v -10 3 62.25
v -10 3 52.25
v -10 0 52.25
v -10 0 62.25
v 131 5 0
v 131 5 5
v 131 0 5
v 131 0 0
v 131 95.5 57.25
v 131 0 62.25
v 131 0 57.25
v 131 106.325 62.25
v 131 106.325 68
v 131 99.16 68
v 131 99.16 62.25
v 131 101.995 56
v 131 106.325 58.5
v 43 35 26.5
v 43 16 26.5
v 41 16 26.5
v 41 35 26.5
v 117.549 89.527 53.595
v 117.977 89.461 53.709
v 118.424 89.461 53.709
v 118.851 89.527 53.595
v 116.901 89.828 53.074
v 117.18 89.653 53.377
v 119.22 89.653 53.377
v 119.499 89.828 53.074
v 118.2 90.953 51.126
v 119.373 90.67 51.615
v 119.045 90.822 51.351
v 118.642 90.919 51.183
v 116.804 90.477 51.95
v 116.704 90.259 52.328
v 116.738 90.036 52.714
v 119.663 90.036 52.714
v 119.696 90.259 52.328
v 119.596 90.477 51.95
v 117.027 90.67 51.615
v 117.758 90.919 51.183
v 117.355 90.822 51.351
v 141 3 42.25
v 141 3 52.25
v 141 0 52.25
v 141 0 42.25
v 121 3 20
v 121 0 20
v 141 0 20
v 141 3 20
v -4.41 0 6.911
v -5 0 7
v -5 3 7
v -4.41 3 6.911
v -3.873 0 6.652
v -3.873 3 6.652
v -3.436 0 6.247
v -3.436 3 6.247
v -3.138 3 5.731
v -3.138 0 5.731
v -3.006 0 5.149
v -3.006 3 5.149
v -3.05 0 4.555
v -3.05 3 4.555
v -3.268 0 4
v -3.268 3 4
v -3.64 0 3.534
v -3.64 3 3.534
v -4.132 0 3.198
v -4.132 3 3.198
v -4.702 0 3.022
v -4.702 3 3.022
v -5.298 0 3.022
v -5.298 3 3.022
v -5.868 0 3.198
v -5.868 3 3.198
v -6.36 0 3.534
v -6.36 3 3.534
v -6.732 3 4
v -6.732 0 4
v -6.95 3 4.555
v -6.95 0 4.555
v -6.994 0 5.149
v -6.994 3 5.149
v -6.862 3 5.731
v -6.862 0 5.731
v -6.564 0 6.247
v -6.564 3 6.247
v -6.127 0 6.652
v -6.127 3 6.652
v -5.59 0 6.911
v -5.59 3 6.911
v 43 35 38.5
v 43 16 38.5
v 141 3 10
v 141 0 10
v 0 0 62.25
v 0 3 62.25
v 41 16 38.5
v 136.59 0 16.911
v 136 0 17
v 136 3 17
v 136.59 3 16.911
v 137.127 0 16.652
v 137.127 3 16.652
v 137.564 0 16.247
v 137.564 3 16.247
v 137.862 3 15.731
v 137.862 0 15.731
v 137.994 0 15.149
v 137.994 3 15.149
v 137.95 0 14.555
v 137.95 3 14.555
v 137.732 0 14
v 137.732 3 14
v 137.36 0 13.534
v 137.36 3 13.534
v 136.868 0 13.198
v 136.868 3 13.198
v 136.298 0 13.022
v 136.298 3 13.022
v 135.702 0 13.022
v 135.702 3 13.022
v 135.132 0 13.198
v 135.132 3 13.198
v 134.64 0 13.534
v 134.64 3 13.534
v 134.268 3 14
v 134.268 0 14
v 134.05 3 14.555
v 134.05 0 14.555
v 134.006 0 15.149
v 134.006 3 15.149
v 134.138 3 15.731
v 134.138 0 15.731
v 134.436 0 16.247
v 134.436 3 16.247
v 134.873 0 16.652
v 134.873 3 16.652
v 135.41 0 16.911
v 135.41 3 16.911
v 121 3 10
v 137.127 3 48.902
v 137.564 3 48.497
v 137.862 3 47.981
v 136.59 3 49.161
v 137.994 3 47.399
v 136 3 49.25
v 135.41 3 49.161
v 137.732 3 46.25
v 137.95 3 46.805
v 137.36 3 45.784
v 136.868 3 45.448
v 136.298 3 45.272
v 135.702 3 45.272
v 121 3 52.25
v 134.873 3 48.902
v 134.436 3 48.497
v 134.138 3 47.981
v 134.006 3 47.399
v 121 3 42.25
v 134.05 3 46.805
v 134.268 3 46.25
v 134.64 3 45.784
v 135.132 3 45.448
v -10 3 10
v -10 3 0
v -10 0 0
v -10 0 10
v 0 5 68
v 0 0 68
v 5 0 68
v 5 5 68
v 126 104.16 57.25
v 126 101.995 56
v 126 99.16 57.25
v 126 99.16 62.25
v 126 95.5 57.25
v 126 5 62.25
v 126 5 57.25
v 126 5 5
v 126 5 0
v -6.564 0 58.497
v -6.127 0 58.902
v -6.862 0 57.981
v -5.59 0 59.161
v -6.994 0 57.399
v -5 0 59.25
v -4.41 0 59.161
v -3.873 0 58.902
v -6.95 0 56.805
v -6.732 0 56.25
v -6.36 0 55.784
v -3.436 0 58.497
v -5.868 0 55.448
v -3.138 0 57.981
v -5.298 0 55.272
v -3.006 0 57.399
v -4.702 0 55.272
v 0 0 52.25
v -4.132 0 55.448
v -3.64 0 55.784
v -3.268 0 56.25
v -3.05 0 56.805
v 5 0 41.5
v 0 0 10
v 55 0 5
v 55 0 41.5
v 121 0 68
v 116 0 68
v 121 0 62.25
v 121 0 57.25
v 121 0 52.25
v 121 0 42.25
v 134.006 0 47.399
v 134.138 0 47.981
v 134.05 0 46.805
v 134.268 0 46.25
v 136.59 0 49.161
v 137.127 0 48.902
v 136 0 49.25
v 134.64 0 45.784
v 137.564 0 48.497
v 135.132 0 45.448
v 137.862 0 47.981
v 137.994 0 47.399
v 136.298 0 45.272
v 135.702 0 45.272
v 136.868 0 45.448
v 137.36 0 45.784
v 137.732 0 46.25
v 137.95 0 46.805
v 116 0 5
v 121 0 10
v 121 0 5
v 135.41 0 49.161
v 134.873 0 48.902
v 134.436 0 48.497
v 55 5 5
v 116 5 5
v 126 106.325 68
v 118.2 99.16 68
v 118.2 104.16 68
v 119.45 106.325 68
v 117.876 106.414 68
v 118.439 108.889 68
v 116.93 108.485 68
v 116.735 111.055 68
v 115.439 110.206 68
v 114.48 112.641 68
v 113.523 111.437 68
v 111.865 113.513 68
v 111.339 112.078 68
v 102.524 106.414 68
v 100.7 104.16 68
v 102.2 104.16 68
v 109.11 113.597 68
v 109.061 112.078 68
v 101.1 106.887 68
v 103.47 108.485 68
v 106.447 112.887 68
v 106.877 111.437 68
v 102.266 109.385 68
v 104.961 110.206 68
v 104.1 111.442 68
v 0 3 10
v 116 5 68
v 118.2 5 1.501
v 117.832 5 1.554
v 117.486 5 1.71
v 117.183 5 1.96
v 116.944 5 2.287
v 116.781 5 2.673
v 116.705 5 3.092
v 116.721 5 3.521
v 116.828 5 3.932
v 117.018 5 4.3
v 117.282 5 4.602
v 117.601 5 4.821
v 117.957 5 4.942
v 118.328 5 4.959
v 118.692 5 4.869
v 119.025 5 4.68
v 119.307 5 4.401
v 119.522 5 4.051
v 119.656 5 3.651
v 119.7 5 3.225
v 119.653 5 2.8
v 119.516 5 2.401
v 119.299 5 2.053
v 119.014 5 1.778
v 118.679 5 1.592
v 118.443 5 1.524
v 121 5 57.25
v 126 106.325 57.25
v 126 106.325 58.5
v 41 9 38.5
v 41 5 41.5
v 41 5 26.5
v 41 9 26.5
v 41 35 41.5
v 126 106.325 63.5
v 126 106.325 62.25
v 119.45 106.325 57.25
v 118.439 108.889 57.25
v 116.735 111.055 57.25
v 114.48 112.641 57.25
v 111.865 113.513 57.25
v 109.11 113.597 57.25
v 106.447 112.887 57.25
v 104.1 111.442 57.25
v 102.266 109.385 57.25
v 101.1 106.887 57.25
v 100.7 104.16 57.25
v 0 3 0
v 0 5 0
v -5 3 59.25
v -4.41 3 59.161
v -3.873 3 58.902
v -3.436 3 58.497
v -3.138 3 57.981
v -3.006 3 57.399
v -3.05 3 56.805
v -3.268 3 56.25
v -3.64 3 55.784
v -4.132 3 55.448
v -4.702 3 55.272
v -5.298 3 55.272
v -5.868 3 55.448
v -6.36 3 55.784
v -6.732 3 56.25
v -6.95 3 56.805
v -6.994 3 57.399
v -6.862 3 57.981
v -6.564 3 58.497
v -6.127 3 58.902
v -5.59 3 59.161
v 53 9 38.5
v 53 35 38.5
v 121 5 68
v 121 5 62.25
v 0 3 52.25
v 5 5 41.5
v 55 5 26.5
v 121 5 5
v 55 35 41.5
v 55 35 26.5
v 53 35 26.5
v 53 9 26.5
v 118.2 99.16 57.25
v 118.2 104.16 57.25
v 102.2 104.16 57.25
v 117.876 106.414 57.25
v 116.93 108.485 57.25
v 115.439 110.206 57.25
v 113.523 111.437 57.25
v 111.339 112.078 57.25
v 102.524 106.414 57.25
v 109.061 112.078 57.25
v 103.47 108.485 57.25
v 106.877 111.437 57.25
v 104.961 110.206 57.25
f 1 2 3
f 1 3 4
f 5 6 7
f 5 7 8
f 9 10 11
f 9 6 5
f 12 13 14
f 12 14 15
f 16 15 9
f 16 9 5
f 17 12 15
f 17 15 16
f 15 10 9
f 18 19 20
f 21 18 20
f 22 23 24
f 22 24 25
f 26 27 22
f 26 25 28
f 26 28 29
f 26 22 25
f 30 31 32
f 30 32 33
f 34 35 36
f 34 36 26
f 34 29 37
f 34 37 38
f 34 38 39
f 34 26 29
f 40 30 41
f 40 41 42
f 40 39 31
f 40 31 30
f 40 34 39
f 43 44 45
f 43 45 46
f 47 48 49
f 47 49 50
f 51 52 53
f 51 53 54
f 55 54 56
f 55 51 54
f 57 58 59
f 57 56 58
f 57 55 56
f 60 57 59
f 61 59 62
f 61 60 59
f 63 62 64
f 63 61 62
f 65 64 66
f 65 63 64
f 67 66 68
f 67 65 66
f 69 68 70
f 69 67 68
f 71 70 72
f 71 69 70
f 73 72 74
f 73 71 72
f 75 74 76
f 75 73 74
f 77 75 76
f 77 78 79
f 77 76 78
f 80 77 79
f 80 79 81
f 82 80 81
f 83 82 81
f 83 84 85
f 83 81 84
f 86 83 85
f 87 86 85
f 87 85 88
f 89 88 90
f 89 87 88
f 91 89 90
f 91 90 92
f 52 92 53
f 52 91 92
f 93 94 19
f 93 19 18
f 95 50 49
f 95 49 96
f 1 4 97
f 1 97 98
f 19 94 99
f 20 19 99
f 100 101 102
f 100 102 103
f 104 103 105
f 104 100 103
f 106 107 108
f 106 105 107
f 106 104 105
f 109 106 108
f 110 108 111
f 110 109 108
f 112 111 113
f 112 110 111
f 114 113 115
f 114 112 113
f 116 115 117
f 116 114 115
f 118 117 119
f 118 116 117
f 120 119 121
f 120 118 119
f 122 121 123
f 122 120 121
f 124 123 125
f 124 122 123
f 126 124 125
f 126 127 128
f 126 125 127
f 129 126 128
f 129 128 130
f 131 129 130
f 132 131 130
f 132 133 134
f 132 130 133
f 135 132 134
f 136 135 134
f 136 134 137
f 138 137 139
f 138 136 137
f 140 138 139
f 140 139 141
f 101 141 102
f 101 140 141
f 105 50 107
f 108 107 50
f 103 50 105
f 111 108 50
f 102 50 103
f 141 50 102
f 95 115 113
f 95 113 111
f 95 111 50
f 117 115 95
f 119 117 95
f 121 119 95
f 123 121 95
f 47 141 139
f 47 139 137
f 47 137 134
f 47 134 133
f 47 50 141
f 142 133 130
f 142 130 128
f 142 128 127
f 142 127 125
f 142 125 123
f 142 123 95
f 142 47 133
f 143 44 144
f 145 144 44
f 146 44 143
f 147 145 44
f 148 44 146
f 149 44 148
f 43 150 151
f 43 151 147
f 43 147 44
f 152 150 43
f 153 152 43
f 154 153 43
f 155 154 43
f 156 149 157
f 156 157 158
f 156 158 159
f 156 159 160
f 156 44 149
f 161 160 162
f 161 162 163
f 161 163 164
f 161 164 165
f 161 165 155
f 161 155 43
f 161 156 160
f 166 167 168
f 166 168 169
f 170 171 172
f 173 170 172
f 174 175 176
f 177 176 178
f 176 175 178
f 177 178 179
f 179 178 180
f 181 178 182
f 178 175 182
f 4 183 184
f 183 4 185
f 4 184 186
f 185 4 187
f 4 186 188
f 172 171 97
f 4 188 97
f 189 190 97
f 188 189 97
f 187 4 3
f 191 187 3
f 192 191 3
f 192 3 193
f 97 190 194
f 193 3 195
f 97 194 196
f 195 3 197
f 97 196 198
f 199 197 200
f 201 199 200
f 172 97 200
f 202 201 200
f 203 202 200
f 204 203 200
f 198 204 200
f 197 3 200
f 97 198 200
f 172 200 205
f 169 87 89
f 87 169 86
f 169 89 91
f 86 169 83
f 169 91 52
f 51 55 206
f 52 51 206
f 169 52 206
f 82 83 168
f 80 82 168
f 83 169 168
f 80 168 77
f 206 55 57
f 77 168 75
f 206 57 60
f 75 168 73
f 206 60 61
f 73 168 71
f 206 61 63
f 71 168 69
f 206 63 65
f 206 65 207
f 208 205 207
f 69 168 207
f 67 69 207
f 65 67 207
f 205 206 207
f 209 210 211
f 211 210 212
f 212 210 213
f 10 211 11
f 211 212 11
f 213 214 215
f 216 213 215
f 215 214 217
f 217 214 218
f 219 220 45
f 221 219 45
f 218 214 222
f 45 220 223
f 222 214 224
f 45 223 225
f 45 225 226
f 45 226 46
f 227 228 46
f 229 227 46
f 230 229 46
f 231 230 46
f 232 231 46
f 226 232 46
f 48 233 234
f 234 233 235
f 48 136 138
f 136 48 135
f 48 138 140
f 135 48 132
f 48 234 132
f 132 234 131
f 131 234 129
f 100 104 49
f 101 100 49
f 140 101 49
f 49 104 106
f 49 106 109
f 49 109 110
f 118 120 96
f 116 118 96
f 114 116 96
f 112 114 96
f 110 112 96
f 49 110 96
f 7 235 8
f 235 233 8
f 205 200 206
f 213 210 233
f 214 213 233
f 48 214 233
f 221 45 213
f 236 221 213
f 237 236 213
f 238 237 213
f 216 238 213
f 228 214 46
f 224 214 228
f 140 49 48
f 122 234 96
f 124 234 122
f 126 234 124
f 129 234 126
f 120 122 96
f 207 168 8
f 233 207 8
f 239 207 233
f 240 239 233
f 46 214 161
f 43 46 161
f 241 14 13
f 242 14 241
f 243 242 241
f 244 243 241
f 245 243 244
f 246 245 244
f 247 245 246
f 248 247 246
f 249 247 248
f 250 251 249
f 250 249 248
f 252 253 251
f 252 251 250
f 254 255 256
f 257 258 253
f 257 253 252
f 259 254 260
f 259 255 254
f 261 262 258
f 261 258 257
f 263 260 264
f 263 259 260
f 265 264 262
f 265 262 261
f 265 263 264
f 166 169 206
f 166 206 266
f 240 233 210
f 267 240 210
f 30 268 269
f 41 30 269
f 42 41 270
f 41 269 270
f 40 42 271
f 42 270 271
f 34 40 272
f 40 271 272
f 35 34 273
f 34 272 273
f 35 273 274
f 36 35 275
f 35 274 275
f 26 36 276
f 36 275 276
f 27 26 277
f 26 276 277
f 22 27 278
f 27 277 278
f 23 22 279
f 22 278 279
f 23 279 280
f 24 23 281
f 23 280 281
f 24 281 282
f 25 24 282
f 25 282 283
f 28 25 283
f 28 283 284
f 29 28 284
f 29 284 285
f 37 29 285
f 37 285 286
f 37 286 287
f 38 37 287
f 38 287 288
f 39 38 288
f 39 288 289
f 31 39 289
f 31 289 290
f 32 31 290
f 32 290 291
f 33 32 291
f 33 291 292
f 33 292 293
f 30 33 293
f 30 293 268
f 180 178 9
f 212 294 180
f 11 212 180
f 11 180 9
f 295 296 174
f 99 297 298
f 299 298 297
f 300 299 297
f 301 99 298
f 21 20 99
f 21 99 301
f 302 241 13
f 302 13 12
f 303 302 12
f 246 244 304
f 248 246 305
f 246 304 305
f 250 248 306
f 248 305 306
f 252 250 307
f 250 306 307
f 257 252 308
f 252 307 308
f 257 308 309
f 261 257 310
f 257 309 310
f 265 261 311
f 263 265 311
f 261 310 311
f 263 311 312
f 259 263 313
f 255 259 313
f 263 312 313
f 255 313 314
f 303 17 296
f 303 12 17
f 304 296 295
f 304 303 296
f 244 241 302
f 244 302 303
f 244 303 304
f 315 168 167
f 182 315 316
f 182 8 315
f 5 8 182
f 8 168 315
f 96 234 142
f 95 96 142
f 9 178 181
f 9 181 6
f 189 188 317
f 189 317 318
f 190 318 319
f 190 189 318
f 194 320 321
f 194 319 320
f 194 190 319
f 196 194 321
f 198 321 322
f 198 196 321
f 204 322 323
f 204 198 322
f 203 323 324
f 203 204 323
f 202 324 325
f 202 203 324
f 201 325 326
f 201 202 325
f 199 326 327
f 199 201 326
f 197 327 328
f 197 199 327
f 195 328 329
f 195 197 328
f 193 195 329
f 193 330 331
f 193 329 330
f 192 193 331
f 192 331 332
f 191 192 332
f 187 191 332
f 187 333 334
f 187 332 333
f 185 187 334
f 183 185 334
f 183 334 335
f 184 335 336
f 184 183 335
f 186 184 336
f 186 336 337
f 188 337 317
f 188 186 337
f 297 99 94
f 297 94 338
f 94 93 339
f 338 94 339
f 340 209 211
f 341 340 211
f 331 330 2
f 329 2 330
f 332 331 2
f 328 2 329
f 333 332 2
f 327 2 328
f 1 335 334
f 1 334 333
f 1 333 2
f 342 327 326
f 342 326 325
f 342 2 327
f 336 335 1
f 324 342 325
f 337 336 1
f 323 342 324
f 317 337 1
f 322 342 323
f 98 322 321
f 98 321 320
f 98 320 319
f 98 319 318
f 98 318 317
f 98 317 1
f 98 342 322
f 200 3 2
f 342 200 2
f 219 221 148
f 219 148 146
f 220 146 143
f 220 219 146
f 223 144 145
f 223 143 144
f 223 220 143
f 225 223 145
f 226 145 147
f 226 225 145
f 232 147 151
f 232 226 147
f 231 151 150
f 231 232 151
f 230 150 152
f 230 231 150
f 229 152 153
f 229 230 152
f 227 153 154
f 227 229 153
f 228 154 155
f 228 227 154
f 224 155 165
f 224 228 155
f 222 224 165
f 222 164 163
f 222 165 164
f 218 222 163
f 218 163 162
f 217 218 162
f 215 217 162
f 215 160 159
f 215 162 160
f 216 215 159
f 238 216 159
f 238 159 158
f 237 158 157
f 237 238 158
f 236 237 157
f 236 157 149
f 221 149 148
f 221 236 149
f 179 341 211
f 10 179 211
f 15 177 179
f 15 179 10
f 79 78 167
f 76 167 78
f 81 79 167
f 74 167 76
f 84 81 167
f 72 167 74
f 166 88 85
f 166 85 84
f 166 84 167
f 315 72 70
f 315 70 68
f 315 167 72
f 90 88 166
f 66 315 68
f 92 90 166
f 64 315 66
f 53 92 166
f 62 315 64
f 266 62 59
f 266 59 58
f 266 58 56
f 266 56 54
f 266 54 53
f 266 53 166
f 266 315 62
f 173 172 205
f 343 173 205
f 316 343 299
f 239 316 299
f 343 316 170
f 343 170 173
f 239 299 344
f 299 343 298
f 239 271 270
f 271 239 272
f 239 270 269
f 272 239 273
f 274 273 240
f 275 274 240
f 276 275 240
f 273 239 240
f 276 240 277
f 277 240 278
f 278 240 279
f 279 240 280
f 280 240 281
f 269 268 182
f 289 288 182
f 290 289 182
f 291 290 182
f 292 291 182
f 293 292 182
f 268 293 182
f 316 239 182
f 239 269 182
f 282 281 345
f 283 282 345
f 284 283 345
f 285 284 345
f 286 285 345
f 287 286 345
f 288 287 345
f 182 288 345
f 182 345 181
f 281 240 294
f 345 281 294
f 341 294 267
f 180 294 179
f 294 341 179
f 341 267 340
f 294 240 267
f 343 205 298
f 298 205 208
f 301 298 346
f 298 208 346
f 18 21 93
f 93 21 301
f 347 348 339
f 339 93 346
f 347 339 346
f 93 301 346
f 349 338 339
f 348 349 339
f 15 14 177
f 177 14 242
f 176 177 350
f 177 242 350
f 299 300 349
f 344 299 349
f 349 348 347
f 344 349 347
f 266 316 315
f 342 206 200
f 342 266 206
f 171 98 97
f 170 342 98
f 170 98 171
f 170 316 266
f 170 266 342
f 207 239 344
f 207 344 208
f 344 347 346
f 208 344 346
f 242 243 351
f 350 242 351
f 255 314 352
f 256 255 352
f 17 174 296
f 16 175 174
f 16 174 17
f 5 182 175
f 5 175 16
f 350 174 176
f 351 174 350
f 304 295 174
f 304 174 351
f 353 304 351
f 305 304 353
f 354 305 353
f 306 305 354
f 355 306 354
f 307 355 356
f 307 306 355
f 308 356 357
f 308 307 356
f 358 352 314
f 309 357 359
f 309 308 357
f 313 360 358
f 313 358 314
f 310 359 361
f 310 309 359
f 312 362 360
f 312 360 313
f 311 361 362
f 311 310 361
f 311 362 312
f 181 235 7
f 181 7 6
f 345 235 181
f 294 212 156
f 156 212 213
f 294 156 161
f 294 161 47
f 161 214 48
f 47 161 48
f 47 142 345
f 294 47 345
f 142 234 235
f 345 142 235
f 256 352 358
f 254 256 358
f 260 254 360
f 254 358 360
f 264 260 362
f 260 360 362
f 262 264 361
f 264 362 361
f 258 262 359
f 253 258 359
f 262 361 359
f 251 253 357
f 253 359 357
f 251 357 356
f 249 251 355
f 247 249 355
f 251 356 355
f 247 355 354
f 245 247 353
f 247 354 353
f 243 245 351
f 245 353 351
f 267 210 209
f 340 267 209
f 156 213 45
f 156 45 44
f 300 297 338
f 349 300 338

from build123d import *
from OCP.BRepAlgoAPI import BRepAlgoAPI_Cut
from OCP.TopTools import TopTools_ListOfShape

# Parameters (mm, degrees)
BOSS_EXTRUDE1_DEPTH              = 5
SKETCH2_R                        = 1.5
BOSS_EXTRUDE2_DEPTH              = 100
SKETCH3_W                        = 5
SKETCH3_H                        = 5
BOSS_EXTRUDE3_DEPTH              = 10
SKETCH5_W                        = 5
SKETCH5_H                        = 4.330127019
BOSS_EXTRUDE4_DEPTH              = 117
SKETCH6_W                        = 5
SKETCH6_H                        = 5
BOSS_EXTRUDE5_DEPTH              = 20
BOSS_EXTRUDE6_DEPTH              = 15
SKETCH9_W                        = 5
SKETCH9_H                        = 5
BOSS_EXTRUDE7_DEPTH              = 10
SKETCH10_W                       = 5
SKETCH10_H                       = 5
BOSS_EXTRUDE8_DEPTH              = 99.159909
SKETCH11_W                       = 10
SKETCH11_H                       = 3
BOSS_EXTRUDE9_DEPTH              = 10
CUT_EXTRUDE1_DEPTH               = 187.084790711
CUT_EXTRUDE1_DEPTH_BACK          = 187.084790711
SKETCH13_R                       = 2
SKETCH14_W                       = 10
SKETCH14_H                       = 3
BOSS_EXTRUDE10_DEPTH             = 20
CUT_EXTRUDE2_DEPTH               = 194.255140511
CUT_EXTRUDE2_DEPTH_BACK          = 194.255140511
SKETCH15_R                       = 2
BOSS_EXTRUDE11_DEPTH             = 7.8
CUT_EXTRUDE3_DEPTH               = 187.016127587
CUT_EXTRUDE3_DEPTH_BACK          = 187.016127587
SKETCH17_W                       = 22.17902444
SKETCH17_H                       = 20
BOSS_EXTRUDE12_DEPTH             = 5.75
BOSS_EXTRUDE12_DEPTH_BACK        = 5
SKETCH19_W                       = 1.5
SKETCH19_H                       = 10.75
BOSS_EXTRUDE13_DEPTH             = 2.742414
SKETCH21_W                       = 1.5
SKETCH21_H                       = 1
BOSS_EXTRUDE15_DEPTH             = 1
BOSS_EXTRUDE17_REACH             = 195.512
CUT_EXTRUDE4_START               = 2
SKETCH23_W                       = 7.8
SKETCH23_H                       = 12
CUT_EXTRUDE4_DEPTH               = 10
BOSS_EXTRUDE19_DEPTH             = 5
BOSS_EXTRUDE19_DEPTH_BACK        = 2.165064
SKETCH23_2_W                     = 7.8
SKETCH23_2_H                     = 12
CUT_EXTRUDE5_DEPTH               = 1.25
BOSS_EXTRUDE20_REACH             = 188.016
SKETCH25_W                       = 5
SKETCH25_H                       = 4.330127019
SKETCH26_W                       = 5
SKETCH26_H                       = 2.16506351
CUT_EXTRUDE6_DEPTH               = 5
SKETCH27_W                       = 5.75
SKETCH27_H                       = 7.16506351
BOSS_EXTRUDE21_DEPTH             = 5
SKETCH29_W                       = 3
SKETCH29_H                       = 30
BOSS_EXTRUDE22_DEPTH             = 55
SKETCH30_W                       = 5
SKETCH30_H                       = 3
BOSS_EXTRUDE23_DEPTH             = 5
SKETCH31_W                       = 5
SKETCH31_H                       = 5
BOSS_EXTRUDE24_DEPTH             = 33.5
SKETCH32_W                       = 2
SKETCH32_H                       = 19
BOSS_EXTRUDE25_DEPTH             = 12
SKETCH34_W                       = 41
SKETCH34_H                       = 3
CUT_EXTRUDE7_DEPTH               = 30
SKETCH35_W                       = 14
SKETCH35_H                       = 12
BOSS_EXTRUDE26_DEPTH             = 7
BOSS_EXTRUDE27_REACH             = 187.154
SKETCH36_W                       = 9
SKETCH36_H                       = 5
BOSS_EXTRUDE27_DIRECTION_2_REACH = 187.154
SKETCH37_W                       = 41.5
SKETCH37_H                       = 5
BOSS_EXTRUDE28_DEPTH             = 41


with BuildPart() as part:
    # Sketch1 → Boss-Extrude1 (new body)
    with BuildSketch(Plane(origin=(0, 0, 0), x_dir=(1, 0, 0), z_dir=(0, 1, 0))):
        Polygon((121, 0), (0, 0), (0, -68), (5, -68), (5, -5), (116, -5), (116, -68), (121, -68), align=None)
    extrude(amount=BOSS_EXTRUDE1_DEPTH)

    # Sketch2 → Boss-Extrude2 (add)
    with BuildSketch(Plane(origin=(0, 3.75, 2.165063509), x_dir=(1, 0, 0), z_dir=(0, 0.866025403784438, 0.500000000000001))):
        with Locations(Location((118.200131686, -0.299868314, 0), (0, 0, 90))):
            Circle(SKETCH2_R)
    extrude(amount=BOSS_EXTRUDE2_DEPTH)

    # Sketch3 → Boss-Extrude3 (add)
    with BuildSketch(Plane(origin=(121, 0, 0), x_dir=(0, 0, -1), z_dir=(1, 0, 0))):
        with Locations((-2.5, 2.5)):
            Rectangle(SKETCH3_W, SKETCH3_H)
    extrude(amount=BOSS_EXTRUDE3_DEPTH)

    # Sketch5 → Boss-Extrude4 (add)
    with BuildSketch(Plane(origin=(0, 3.75, 2.165063509), x_dir=(1, 0, 0), z_dir=(0, 0.866025403784438, 0.500000000000001))):
        with Locations((128.5, 0.33493649)):
            Rectangle(SKETCH5_W, SKETCH5_H)
    extrude(amount=BOSS_EXTRUDE4_DEPTH)

    # Sketch6 → Boss-Extrude5 (add)
    with BuildSketch(Plane(origin=(0, 1.25, -2.165063509), x_dir=(-1, 0, 0), z_dir=(0, 0.500000000000001, -0.8660254037844382))):
        with Locations((-128.5, 118.830127019)):
            Rectangle(SKETCH6_W, SKETCH6_H)
    extrude(amount=BOSS_EXTRUDE5_DEPTH)

    # Sketch7 → Boss-Extrude6 (add)
    with BuildSketch(Plane.ZY.offset(-126)):
        Polygon((45.509618943, 113.824972243), (41.179491924, 116.324972243), (38.679491924, 111.994845224), (43.009618943, 109.494845224), align=None)
    extrude(amount=BOSS_EXTRUDE6_DEPTH)

    # Sketch9 → Boss-Extrude7 (add)
    with BuildSketch(Plane(origin=(121, 0, 0), x_dir=(0, 0, -1), z_dir=(1, 0, 0))):
        with Locations((-59.75, 2.5)):
            Rectangle(SKETCH9_W, SKETCH9_H)
    extrude(amount=BOSS_EXTRUDE7_DEPTH)

    # Sketch10 → Boss-Extrude8 (add)
    with BuildSketch(Plane(origin=(0, 5, 0), x_dir=(1, 0, 0), z_dir=(0, 1, 0))):
        with Locations((128.5, -59.75)):
            Rectangle(SKETCH10_W, SKETCH10_H)
    extrude(amount=BOSS_EXTRUDE8_DEPTH)

    # Sketch11 → Boss-Extrude9 (add)
    with BuildSketch(Plane.ZY):
        with Locations((57.25, 1.5)):
            Rectangle(SKETCH11_W, SKETCH11_H)
        with Locations((5, 1.5)):
            Rectangle(SKETCH11_W, SKETCH11_H)
    extrude(amount=BOSS_EXTRUDE9_DEPTH)

    # Sketch13 → Cut-Extrude1 (cut, two sides: drawn at the far end of the back side and taken through both)
    with BuildSketch(Plane(origin=(0, 3, 0), x_dir=(1, 0, 0), z_dir=(0, 1, 0)).offset(-CUT_EXTRUDE1_DEPTH_BACK)):
        with Locations(Location((-5, -5, 0), (0, 0, 270))):
            Circle(SKETCH13_R)
        with Locations(Location((-5, -57.25, 0), (0, 0, 270))):
            Circle(SKETCH13_R)
    extrude(amount=CUT_EXTRUDE1_DEPTH + CUT_EXTRUDE1_DEPTH_BACK, mode=Mode.SUBTRACT)

    # Sketch14 → Boss-Extrude10 (add)
    with BuildSketch(Plane(origin=(121, 0, 0), x_dir=(0, 0, -1), z_dir=(1, 0, 0))):
        with Locations((-15, 1.5)):
            Rectangle(SKETCH14_W, SKETCH14_H)
        with Locations((-47.25, 1.5)):
            Rectangle(SKETCH14_W, SKETCH14_H)
    extrude(amount=BOSS_EXTRUDE10_DEPTH)

    # Sketch15 → Cut-Extrude2 (cut, two sides: drawn at the far end of the back side and taken through both)
    with BuildSketch(Plane(origin=(0, 3, 0), x_dir=(1, 0, 0), z_dir=(0, 1, 0)).offset(-CUT_EXTRUDE2_DEPTH_BACK)):
        with Locations(Location((136, -15, 0), (0, 0, 270))):
            Circle(SKETCH15_R)
        with Locations(Location((136, -47.25, 0), (0, 0, 270))):
            Circle(SKETCH15_R)
    extrude(amount=CUT_EXTRUDE2_DEPTH + CUT_EXTRUDE2_DEPTH_BACK, mode=Mode.SUBTRACT)

    # Sketch16 → Boss-Extrude11 (add)
    with BuildSketch(Plane.ZY.offset(-126)):
        Polygon((49.839745962, 111.324972243), (67, 101.417494955), (64.5, 97.087367936), (47.339745962, 106.994845224), align=None)
    extrude(amount=BOSS_EXTRUDE11_DEPTH)

    # Sketch17 → Cut-Extrude3 (cut, two sides: drawn at the far end of the back side and taken through both)
    with BuildSketch(Plane(origin=(0, 105.074972243, 60.665063509), x_dir=(1, 0, 0), z_dir=(0, 0.8660254037844382, 0.500000000000001)).offset(-CUT_EXTRUDE3_DEPTH_BACK)):
        with Locations((119.91048778, 12.5)):
            Rectangle(SKETCH17_W, SKETCH17_H)
    extrude(amount=CUT_EXTRUDE3_DEPTH + CUT_EXTRUDE3_DEPTH_BACK, mode=Mode.SUBTRACT)



with BuildPart() as body_2:
    # Sketch18 → Boss-Extrude12 (new, two sides: drawn at the far end of the back side and taken through both)
    with BuildSketch(Plane.XY.offset(62.25).offset(-BOSS_EXTRUDE12_DEPTH_BACK)):
        with BuildLine():
            Line((118.2, 104.159908733), (119.7, 104.159908733))
            ThreePointArc((119.7, 104.159908733), (110.2, 113.659908733), (100.7, 104.159908733))
            Line((100.7, 104.159908733), (102.2, 104.159908733))
            ThreePointArc((102.2, 104.159908733), (110.2, 112.159908733), (118.2, 104.159908733))
        make_face()
    extrude(amount=BOSS_EXTRUDE12_DEPTH + BOSS_EXTRUDE12_DEPTH_BACK)


with BuildPart() as part_1:
    add(part.part)

    add(body_2.part)  # Boss-Extrude13 merges body 2
    # Sketch19 → Boss-Extrude13 (add)
    with BuildSketch(Plane.XZ.offset(-104.159908733)):
        with Locations((118.95, 62.625)):
            Rectangle(SKETCH19_W, SKETCH19_H)
    extrude(amount=BOSS_EXTRUDE13_DEPTH)

    # Sketch21 → Boss-Extrude15 (add)
    with BuildSketch(Plane.XZ.offset(-101.417494955)):
        with Locations((118.95, 67.5)):
            Rectangle(SKETCH21_W, SKETCH21_H)
    extrude(amount=BOSS_EXTRUDE15_DEPTH)

    # Boss-Extrude17: up to this plane
    boss_extrude17_end = Plane(origin=(119.7, 101.417494955, 68), z_dir=(0, 0, -1))
    # Sketch20 → Boss-Extrude17 (add, up to the surface)
    with BuildSketch(Plane(origin=(0, -3.657477288, 6.334936491), x_dir=(1, 0, 0), z_dir=(0, -0.5000000000000039, 0.8660254037844365)), mode=Mode.PRIVATE) as boss_extrude17_sk1:
        Polygon((126, 116.330127019), (126, 121.330127019), (119.7, 121.330127019), (118.2, 121.330127019), (118.2, 116.330127019), align=None)
    boss_extrude17_tool1 = split(extrude(boss_extrude17_sk1.sketch, amount=BOSS_EXTRUDE17_REACH, mode=Mode.PRIVATE), bisect_by=boss_extrude17_end, keep=Keep.BOTH, mode=Mode.PRIVATE)
    add(boss_extrude17_tool1.solids().sort_by_distance((122.1, 99.252431, 65.75))[0])

    # Sketch23 → Cut-Extrude4 (cut)
    with BuildSketch(Plane(origin=(0, 104.159908733, 0), x_dir=(-1, 0, 0), z_dir=(0, -1, 0)).offset(CUT_EXTRUDE4_START)):
        with Locations((-122.1, -62)):
            Rectangle(SKETCH23_W, SKETCH23_H)
    extrude(amount=CUT_EXTRUDE4_DEPTH, mode=Mode.SUBTRACT)

    # Sketch23<2> → Boss-Extrude19 (add, two sides: drawn at the far end of the back side and taken through both)
    with BuildSketch(Plane(origin=(0, 104.159908733, 0), x_dir=(-1, 0, 0), z_dir=(0, -1, 0)).offset(-BOSS_EXTRUDE19_DEPTH_BACK)):
        with Locations((-122.1, -62)):
            Rectangle(SKETCH23_2_W, SKETCH23_2_H)
    extrude(amount=BOSS_EXTRUDE19_DEPTH + BOSS_EXTRUDE19_DEPTH_BACK)


with BuildPart() as cut_extrude5_tool:
    # Sketch24 → Cut-Extrude5 (new body)
    with BuildSketch(Plane(origin=(0, 0, 56), x_dir=(-1, 0, 0), z_dir=(0, 0, -1))):
        Polygon((-126, 106.324972243), (-126, 101.994845224), (-126, 99.159908733), (-118.2, 99.159908733), (-118.2, 106.324972243), align=None)
    extrude(amount=-CUT_EXTRUDE5_DEPTH)


with BuildPart() as part_2:
    add(part_1.part)

    # Cut-Extrude5: cut by cut_extrude5_tool, with a tolerance
    cut_extrude5_stock = TopTools_ListOfShape()
    cut_extrude5_stock.Append(part_2.part.wrapped)
    cut_extrude5_tools = TopTools_ListOfShape()
    cut_extrude5_tools.Append(cut_extrude5_tool.part.wrapped)
    cut_extrude5_cut = BRepAlgoAPI_Cut()
    cut_extrude5_cut.SetArguments(cut_extrude5_stock)
    cut_extrude5_cut.SetTools(cut_extrude5_tools)
    cut_extrude5_cut.SetFuzzyValue(0.00001)
    cut_extrude5_cut.Build()
    add(Compound.cast(cut_extrude5_cut.Shape()).solids(), mode=Mode.REPLACE)

    # Boss-Extrude20: up to this face of the body (flat: up to its plane)
    boss_extrude20_end = Plane(part_2.part.faces().sort_by_distance((122.724999943, 106.324972733, 62.625))[0])
    # Sketch25 → Boss-Extrude20 (add, up to the picked face)
    with BuildSketch(Plane(origin=(0, 105.074972243, 60.665063509), x_dir=(1, 0, 0), z_dir=(0, 0.8660254037844382, 0.500000000000001)), mode=Mode.PRIVATE) as boss_extrude20_sk1:
        with Locations((128.5, 0.33493649)):
            Rectangle(SKETCH25_W, SKETCH25_H)
    boss_extrude20_tool1 = split(extrude(boss_extrude20_sk1.sketch, amount=BOSS_EXTRUDE20_REACH, mode=Mode.PRIVATE), bisect_by=boss_extrude20_end, keep=Keep.BOTH, mode=Mode.PRIVATE)
    add(boss_extrude20_tool1.solids().sort_by(Axis((128.5, 105.24244, 60.375), (0, 0.8660254037844382, 0.500000000000001)))[0])


with BuildPart() as cut_extrude6_tool:
    # Sketch26 → Cut-Extrude6 (new body)
    with BuildSketch(Plane.XY.offset(62.25)):
        with Locations((128.5, 105.242440488)):
            Rectangle(SKETCH26_W, SKETCH26_H)
    extrude(amount=CUT_EXTRUDE6_DEPTH)


with BuildPart() as part_3:
    add(part_2.part)

    # Cut-Extrude6: cut by cut_extrude6_tool, with a tolerance
    cut_extrude6_stock = TopTools_ListOfShape()
    cut_extrude6_stock.Append(part_3.part.wrapped)
    cut_extrude6_tools = TopTools_ListOfShape()
    cut_extrude6_tools.Append(cut_extrude6_tool.part.wrapped)
    cut_extrude6_cut = BRepAlgoAPI_Cut()
    cut_extrude6_cut.SetArguments(cut_extrude6_stock)
    cut_extrude6_cut.SetTools(cut_extrude6_tools)
    cut_extrude6_cut.SetFuzzyValue(0.00001)
    cut_extrude6_cut.Build()
    add(Compound.cast(cut_extrude6_cut.Shape()).solids(), mode=Mode.REPLACE)

    # Sketch27 → Boss-Extrude21 (add)
    with BuildSketch(Plane(origin=(126, 0, 0), x_dir=(0, 0, -1), z_dir=(1, 0, 0))):
        with Locations((-65.125, 102.742440488)):
            Rectangle(SKETCH27_W, SKETCH27_H)
    extrude(amount=BOSS_EXTRUDE21_DEPTH)

    # Sketch29 → Boss-Extrude22 (add)
    with BuildSketch(Plane.ZY):
        with Locations((40, 20)):
            Rectangle(SKETCH29_W, SKETCH29_H)
    extrude(amount=-BOSS_EXTRUDE22_DEPTH)

    # Sketch30 → Boss-Extrude23 (add)
    with BuildSketch(Plane.XZ.offset(-5)):
        with Locations((52.5, 40)):
            Rectangle(SKETCH30_W, SKETCH30_H)
    extrude(amount=BOSS_EXTRUDE23_DEPTH)

    # Sketch31 → Boss-Extrude24 (add)
    with BuildSketch(Plane(origin=(0, 0, 38.5), x_dir=(-1, 0, 0), z_dir=(0, 0, -1))):
        with Locations((-52.5, 2.5)):
            Rectangle(SKETCH31_W, SKETCH31_H)
    extrude(amount=BOSS_EXTRUDE24_DEPTH)

    # Sketch32 → Boss-Extrude25 (add)
    with BuildSketch(Plane(origin=(0, 0, 38.5), x_dir=(-1, 0, 0), z_dir=(0, 0, -1))):
        Polygon((-41, 9), (-53, 9), (-53, 35), (-55, 35), (-55, 7), (-41, 7), align=None)
        with Locations((-42, 25.5)):
            Rectangle(SKETCH32_W, SKETCH32_H)
    extrude(amount=BOSS_EXTRUDE25_DEPTH)

    # Sketch34 → Cut-Extrude7 (cut)
    with BuildSketch(Plane(origin=(0, 35, 0), x_dir=(1, 0, 0), z_dir=(0, 1, 0))):
        with Locations((20.5, -40)):
            Rectangle(SKETCH34_W, SKETCH34_H)
    extrude(amount=-CUT_EXTRUDE7_DEPTH, mode=Mode.SUBTRACT)

    # Sketch35 → Boss-Extrude26 (add)
    with BuildSketch(Plane.XZ.offset(-7)):
        with Locations((48, 32.5)):
            Rectangle(SKETCH35_W, SKETCH35_H)
    extrude(amount=BOSS_EXTRUDE26_DEPTH)

    # Boss-Extrude27: up to this face of the body (flat: up to its plane)
    boss_extrude27_end = Plane(part_3.part.faces().sort_by_distance((48.252808989, 19.016853933, 41.5))[0])
    # Sketch36 → Boss-Extrude27 (add, up to the picked face)
    with BuildSketch(Plane.XY.offset(38.5), mode=Mode.PRIVATE) as boss_extrude27_sk1:
        with Locations((45.5, 2.5)):
            Rectangle(SKETCH36_W, SKETCH36_H)
    boss_extrude27_tool1 = split(extrude(boss_extrude27_sk1.sketch, amount=BOSS_EXTRUDE27_REACH, mode=Mode.PRIVATE), bisect_by=boss_extrude27_end, keep=Keep.BOTH, mode=Mode.PRIVATE)
    add(boss_extrude27_tool1.solids().sort_by(Axis((45.5, 2.5, 38.5), (0, 0, 1)))[0])

    # Boss-Extrude27 direction 2: up to this face of the body (flat: up to its plane)
    boss_extrude27_direction_2_end = Plane(part_3.part.faces().sort_by_distance((27.5, 2.5, 5))[0])
    # Sketch36 → Boss-Extrude27 direction 2 (add, up to the picked face)
    with BuildSketch(Plane.XY.offset(38.5), mode=Mode.PRIVATE) as boss_extrude27_direction_2_sk1:
        with Locations((45.5, 2.5)):
            Rectangle(SKETCH36_W, SKETCH36_H)
    boss_extrude27_direction_2_tool1 = split(extrude(boss_extrude27_direction_2_sk1.sketch, amount=-BOSS_EXTRUDE27_DIRECTION_2_REACH, mode=Mode.PRIVATE), bisect_by=boss_extrude27_direction_2_end, keep=Keep.BOTH, mode=Mode.PRIVATE)
    add(boss_extrude27_direction_2_tool1.solids().sort_by(Axis((45.5, 2.5, 38.5), (0, 0, -1)))[0])

    # Sketch37 → Boss-Extrude28 (add)
    with BuildSketch(Plane.ZY.offset(-41)):
        with Locations((20.75, 2.5)):
            Rectangle(SKETCH37_W, SKETCH37_H)
    extrude(amount=BOSS_EXTRUDE28_DEPTH)


solid = part_3.part
